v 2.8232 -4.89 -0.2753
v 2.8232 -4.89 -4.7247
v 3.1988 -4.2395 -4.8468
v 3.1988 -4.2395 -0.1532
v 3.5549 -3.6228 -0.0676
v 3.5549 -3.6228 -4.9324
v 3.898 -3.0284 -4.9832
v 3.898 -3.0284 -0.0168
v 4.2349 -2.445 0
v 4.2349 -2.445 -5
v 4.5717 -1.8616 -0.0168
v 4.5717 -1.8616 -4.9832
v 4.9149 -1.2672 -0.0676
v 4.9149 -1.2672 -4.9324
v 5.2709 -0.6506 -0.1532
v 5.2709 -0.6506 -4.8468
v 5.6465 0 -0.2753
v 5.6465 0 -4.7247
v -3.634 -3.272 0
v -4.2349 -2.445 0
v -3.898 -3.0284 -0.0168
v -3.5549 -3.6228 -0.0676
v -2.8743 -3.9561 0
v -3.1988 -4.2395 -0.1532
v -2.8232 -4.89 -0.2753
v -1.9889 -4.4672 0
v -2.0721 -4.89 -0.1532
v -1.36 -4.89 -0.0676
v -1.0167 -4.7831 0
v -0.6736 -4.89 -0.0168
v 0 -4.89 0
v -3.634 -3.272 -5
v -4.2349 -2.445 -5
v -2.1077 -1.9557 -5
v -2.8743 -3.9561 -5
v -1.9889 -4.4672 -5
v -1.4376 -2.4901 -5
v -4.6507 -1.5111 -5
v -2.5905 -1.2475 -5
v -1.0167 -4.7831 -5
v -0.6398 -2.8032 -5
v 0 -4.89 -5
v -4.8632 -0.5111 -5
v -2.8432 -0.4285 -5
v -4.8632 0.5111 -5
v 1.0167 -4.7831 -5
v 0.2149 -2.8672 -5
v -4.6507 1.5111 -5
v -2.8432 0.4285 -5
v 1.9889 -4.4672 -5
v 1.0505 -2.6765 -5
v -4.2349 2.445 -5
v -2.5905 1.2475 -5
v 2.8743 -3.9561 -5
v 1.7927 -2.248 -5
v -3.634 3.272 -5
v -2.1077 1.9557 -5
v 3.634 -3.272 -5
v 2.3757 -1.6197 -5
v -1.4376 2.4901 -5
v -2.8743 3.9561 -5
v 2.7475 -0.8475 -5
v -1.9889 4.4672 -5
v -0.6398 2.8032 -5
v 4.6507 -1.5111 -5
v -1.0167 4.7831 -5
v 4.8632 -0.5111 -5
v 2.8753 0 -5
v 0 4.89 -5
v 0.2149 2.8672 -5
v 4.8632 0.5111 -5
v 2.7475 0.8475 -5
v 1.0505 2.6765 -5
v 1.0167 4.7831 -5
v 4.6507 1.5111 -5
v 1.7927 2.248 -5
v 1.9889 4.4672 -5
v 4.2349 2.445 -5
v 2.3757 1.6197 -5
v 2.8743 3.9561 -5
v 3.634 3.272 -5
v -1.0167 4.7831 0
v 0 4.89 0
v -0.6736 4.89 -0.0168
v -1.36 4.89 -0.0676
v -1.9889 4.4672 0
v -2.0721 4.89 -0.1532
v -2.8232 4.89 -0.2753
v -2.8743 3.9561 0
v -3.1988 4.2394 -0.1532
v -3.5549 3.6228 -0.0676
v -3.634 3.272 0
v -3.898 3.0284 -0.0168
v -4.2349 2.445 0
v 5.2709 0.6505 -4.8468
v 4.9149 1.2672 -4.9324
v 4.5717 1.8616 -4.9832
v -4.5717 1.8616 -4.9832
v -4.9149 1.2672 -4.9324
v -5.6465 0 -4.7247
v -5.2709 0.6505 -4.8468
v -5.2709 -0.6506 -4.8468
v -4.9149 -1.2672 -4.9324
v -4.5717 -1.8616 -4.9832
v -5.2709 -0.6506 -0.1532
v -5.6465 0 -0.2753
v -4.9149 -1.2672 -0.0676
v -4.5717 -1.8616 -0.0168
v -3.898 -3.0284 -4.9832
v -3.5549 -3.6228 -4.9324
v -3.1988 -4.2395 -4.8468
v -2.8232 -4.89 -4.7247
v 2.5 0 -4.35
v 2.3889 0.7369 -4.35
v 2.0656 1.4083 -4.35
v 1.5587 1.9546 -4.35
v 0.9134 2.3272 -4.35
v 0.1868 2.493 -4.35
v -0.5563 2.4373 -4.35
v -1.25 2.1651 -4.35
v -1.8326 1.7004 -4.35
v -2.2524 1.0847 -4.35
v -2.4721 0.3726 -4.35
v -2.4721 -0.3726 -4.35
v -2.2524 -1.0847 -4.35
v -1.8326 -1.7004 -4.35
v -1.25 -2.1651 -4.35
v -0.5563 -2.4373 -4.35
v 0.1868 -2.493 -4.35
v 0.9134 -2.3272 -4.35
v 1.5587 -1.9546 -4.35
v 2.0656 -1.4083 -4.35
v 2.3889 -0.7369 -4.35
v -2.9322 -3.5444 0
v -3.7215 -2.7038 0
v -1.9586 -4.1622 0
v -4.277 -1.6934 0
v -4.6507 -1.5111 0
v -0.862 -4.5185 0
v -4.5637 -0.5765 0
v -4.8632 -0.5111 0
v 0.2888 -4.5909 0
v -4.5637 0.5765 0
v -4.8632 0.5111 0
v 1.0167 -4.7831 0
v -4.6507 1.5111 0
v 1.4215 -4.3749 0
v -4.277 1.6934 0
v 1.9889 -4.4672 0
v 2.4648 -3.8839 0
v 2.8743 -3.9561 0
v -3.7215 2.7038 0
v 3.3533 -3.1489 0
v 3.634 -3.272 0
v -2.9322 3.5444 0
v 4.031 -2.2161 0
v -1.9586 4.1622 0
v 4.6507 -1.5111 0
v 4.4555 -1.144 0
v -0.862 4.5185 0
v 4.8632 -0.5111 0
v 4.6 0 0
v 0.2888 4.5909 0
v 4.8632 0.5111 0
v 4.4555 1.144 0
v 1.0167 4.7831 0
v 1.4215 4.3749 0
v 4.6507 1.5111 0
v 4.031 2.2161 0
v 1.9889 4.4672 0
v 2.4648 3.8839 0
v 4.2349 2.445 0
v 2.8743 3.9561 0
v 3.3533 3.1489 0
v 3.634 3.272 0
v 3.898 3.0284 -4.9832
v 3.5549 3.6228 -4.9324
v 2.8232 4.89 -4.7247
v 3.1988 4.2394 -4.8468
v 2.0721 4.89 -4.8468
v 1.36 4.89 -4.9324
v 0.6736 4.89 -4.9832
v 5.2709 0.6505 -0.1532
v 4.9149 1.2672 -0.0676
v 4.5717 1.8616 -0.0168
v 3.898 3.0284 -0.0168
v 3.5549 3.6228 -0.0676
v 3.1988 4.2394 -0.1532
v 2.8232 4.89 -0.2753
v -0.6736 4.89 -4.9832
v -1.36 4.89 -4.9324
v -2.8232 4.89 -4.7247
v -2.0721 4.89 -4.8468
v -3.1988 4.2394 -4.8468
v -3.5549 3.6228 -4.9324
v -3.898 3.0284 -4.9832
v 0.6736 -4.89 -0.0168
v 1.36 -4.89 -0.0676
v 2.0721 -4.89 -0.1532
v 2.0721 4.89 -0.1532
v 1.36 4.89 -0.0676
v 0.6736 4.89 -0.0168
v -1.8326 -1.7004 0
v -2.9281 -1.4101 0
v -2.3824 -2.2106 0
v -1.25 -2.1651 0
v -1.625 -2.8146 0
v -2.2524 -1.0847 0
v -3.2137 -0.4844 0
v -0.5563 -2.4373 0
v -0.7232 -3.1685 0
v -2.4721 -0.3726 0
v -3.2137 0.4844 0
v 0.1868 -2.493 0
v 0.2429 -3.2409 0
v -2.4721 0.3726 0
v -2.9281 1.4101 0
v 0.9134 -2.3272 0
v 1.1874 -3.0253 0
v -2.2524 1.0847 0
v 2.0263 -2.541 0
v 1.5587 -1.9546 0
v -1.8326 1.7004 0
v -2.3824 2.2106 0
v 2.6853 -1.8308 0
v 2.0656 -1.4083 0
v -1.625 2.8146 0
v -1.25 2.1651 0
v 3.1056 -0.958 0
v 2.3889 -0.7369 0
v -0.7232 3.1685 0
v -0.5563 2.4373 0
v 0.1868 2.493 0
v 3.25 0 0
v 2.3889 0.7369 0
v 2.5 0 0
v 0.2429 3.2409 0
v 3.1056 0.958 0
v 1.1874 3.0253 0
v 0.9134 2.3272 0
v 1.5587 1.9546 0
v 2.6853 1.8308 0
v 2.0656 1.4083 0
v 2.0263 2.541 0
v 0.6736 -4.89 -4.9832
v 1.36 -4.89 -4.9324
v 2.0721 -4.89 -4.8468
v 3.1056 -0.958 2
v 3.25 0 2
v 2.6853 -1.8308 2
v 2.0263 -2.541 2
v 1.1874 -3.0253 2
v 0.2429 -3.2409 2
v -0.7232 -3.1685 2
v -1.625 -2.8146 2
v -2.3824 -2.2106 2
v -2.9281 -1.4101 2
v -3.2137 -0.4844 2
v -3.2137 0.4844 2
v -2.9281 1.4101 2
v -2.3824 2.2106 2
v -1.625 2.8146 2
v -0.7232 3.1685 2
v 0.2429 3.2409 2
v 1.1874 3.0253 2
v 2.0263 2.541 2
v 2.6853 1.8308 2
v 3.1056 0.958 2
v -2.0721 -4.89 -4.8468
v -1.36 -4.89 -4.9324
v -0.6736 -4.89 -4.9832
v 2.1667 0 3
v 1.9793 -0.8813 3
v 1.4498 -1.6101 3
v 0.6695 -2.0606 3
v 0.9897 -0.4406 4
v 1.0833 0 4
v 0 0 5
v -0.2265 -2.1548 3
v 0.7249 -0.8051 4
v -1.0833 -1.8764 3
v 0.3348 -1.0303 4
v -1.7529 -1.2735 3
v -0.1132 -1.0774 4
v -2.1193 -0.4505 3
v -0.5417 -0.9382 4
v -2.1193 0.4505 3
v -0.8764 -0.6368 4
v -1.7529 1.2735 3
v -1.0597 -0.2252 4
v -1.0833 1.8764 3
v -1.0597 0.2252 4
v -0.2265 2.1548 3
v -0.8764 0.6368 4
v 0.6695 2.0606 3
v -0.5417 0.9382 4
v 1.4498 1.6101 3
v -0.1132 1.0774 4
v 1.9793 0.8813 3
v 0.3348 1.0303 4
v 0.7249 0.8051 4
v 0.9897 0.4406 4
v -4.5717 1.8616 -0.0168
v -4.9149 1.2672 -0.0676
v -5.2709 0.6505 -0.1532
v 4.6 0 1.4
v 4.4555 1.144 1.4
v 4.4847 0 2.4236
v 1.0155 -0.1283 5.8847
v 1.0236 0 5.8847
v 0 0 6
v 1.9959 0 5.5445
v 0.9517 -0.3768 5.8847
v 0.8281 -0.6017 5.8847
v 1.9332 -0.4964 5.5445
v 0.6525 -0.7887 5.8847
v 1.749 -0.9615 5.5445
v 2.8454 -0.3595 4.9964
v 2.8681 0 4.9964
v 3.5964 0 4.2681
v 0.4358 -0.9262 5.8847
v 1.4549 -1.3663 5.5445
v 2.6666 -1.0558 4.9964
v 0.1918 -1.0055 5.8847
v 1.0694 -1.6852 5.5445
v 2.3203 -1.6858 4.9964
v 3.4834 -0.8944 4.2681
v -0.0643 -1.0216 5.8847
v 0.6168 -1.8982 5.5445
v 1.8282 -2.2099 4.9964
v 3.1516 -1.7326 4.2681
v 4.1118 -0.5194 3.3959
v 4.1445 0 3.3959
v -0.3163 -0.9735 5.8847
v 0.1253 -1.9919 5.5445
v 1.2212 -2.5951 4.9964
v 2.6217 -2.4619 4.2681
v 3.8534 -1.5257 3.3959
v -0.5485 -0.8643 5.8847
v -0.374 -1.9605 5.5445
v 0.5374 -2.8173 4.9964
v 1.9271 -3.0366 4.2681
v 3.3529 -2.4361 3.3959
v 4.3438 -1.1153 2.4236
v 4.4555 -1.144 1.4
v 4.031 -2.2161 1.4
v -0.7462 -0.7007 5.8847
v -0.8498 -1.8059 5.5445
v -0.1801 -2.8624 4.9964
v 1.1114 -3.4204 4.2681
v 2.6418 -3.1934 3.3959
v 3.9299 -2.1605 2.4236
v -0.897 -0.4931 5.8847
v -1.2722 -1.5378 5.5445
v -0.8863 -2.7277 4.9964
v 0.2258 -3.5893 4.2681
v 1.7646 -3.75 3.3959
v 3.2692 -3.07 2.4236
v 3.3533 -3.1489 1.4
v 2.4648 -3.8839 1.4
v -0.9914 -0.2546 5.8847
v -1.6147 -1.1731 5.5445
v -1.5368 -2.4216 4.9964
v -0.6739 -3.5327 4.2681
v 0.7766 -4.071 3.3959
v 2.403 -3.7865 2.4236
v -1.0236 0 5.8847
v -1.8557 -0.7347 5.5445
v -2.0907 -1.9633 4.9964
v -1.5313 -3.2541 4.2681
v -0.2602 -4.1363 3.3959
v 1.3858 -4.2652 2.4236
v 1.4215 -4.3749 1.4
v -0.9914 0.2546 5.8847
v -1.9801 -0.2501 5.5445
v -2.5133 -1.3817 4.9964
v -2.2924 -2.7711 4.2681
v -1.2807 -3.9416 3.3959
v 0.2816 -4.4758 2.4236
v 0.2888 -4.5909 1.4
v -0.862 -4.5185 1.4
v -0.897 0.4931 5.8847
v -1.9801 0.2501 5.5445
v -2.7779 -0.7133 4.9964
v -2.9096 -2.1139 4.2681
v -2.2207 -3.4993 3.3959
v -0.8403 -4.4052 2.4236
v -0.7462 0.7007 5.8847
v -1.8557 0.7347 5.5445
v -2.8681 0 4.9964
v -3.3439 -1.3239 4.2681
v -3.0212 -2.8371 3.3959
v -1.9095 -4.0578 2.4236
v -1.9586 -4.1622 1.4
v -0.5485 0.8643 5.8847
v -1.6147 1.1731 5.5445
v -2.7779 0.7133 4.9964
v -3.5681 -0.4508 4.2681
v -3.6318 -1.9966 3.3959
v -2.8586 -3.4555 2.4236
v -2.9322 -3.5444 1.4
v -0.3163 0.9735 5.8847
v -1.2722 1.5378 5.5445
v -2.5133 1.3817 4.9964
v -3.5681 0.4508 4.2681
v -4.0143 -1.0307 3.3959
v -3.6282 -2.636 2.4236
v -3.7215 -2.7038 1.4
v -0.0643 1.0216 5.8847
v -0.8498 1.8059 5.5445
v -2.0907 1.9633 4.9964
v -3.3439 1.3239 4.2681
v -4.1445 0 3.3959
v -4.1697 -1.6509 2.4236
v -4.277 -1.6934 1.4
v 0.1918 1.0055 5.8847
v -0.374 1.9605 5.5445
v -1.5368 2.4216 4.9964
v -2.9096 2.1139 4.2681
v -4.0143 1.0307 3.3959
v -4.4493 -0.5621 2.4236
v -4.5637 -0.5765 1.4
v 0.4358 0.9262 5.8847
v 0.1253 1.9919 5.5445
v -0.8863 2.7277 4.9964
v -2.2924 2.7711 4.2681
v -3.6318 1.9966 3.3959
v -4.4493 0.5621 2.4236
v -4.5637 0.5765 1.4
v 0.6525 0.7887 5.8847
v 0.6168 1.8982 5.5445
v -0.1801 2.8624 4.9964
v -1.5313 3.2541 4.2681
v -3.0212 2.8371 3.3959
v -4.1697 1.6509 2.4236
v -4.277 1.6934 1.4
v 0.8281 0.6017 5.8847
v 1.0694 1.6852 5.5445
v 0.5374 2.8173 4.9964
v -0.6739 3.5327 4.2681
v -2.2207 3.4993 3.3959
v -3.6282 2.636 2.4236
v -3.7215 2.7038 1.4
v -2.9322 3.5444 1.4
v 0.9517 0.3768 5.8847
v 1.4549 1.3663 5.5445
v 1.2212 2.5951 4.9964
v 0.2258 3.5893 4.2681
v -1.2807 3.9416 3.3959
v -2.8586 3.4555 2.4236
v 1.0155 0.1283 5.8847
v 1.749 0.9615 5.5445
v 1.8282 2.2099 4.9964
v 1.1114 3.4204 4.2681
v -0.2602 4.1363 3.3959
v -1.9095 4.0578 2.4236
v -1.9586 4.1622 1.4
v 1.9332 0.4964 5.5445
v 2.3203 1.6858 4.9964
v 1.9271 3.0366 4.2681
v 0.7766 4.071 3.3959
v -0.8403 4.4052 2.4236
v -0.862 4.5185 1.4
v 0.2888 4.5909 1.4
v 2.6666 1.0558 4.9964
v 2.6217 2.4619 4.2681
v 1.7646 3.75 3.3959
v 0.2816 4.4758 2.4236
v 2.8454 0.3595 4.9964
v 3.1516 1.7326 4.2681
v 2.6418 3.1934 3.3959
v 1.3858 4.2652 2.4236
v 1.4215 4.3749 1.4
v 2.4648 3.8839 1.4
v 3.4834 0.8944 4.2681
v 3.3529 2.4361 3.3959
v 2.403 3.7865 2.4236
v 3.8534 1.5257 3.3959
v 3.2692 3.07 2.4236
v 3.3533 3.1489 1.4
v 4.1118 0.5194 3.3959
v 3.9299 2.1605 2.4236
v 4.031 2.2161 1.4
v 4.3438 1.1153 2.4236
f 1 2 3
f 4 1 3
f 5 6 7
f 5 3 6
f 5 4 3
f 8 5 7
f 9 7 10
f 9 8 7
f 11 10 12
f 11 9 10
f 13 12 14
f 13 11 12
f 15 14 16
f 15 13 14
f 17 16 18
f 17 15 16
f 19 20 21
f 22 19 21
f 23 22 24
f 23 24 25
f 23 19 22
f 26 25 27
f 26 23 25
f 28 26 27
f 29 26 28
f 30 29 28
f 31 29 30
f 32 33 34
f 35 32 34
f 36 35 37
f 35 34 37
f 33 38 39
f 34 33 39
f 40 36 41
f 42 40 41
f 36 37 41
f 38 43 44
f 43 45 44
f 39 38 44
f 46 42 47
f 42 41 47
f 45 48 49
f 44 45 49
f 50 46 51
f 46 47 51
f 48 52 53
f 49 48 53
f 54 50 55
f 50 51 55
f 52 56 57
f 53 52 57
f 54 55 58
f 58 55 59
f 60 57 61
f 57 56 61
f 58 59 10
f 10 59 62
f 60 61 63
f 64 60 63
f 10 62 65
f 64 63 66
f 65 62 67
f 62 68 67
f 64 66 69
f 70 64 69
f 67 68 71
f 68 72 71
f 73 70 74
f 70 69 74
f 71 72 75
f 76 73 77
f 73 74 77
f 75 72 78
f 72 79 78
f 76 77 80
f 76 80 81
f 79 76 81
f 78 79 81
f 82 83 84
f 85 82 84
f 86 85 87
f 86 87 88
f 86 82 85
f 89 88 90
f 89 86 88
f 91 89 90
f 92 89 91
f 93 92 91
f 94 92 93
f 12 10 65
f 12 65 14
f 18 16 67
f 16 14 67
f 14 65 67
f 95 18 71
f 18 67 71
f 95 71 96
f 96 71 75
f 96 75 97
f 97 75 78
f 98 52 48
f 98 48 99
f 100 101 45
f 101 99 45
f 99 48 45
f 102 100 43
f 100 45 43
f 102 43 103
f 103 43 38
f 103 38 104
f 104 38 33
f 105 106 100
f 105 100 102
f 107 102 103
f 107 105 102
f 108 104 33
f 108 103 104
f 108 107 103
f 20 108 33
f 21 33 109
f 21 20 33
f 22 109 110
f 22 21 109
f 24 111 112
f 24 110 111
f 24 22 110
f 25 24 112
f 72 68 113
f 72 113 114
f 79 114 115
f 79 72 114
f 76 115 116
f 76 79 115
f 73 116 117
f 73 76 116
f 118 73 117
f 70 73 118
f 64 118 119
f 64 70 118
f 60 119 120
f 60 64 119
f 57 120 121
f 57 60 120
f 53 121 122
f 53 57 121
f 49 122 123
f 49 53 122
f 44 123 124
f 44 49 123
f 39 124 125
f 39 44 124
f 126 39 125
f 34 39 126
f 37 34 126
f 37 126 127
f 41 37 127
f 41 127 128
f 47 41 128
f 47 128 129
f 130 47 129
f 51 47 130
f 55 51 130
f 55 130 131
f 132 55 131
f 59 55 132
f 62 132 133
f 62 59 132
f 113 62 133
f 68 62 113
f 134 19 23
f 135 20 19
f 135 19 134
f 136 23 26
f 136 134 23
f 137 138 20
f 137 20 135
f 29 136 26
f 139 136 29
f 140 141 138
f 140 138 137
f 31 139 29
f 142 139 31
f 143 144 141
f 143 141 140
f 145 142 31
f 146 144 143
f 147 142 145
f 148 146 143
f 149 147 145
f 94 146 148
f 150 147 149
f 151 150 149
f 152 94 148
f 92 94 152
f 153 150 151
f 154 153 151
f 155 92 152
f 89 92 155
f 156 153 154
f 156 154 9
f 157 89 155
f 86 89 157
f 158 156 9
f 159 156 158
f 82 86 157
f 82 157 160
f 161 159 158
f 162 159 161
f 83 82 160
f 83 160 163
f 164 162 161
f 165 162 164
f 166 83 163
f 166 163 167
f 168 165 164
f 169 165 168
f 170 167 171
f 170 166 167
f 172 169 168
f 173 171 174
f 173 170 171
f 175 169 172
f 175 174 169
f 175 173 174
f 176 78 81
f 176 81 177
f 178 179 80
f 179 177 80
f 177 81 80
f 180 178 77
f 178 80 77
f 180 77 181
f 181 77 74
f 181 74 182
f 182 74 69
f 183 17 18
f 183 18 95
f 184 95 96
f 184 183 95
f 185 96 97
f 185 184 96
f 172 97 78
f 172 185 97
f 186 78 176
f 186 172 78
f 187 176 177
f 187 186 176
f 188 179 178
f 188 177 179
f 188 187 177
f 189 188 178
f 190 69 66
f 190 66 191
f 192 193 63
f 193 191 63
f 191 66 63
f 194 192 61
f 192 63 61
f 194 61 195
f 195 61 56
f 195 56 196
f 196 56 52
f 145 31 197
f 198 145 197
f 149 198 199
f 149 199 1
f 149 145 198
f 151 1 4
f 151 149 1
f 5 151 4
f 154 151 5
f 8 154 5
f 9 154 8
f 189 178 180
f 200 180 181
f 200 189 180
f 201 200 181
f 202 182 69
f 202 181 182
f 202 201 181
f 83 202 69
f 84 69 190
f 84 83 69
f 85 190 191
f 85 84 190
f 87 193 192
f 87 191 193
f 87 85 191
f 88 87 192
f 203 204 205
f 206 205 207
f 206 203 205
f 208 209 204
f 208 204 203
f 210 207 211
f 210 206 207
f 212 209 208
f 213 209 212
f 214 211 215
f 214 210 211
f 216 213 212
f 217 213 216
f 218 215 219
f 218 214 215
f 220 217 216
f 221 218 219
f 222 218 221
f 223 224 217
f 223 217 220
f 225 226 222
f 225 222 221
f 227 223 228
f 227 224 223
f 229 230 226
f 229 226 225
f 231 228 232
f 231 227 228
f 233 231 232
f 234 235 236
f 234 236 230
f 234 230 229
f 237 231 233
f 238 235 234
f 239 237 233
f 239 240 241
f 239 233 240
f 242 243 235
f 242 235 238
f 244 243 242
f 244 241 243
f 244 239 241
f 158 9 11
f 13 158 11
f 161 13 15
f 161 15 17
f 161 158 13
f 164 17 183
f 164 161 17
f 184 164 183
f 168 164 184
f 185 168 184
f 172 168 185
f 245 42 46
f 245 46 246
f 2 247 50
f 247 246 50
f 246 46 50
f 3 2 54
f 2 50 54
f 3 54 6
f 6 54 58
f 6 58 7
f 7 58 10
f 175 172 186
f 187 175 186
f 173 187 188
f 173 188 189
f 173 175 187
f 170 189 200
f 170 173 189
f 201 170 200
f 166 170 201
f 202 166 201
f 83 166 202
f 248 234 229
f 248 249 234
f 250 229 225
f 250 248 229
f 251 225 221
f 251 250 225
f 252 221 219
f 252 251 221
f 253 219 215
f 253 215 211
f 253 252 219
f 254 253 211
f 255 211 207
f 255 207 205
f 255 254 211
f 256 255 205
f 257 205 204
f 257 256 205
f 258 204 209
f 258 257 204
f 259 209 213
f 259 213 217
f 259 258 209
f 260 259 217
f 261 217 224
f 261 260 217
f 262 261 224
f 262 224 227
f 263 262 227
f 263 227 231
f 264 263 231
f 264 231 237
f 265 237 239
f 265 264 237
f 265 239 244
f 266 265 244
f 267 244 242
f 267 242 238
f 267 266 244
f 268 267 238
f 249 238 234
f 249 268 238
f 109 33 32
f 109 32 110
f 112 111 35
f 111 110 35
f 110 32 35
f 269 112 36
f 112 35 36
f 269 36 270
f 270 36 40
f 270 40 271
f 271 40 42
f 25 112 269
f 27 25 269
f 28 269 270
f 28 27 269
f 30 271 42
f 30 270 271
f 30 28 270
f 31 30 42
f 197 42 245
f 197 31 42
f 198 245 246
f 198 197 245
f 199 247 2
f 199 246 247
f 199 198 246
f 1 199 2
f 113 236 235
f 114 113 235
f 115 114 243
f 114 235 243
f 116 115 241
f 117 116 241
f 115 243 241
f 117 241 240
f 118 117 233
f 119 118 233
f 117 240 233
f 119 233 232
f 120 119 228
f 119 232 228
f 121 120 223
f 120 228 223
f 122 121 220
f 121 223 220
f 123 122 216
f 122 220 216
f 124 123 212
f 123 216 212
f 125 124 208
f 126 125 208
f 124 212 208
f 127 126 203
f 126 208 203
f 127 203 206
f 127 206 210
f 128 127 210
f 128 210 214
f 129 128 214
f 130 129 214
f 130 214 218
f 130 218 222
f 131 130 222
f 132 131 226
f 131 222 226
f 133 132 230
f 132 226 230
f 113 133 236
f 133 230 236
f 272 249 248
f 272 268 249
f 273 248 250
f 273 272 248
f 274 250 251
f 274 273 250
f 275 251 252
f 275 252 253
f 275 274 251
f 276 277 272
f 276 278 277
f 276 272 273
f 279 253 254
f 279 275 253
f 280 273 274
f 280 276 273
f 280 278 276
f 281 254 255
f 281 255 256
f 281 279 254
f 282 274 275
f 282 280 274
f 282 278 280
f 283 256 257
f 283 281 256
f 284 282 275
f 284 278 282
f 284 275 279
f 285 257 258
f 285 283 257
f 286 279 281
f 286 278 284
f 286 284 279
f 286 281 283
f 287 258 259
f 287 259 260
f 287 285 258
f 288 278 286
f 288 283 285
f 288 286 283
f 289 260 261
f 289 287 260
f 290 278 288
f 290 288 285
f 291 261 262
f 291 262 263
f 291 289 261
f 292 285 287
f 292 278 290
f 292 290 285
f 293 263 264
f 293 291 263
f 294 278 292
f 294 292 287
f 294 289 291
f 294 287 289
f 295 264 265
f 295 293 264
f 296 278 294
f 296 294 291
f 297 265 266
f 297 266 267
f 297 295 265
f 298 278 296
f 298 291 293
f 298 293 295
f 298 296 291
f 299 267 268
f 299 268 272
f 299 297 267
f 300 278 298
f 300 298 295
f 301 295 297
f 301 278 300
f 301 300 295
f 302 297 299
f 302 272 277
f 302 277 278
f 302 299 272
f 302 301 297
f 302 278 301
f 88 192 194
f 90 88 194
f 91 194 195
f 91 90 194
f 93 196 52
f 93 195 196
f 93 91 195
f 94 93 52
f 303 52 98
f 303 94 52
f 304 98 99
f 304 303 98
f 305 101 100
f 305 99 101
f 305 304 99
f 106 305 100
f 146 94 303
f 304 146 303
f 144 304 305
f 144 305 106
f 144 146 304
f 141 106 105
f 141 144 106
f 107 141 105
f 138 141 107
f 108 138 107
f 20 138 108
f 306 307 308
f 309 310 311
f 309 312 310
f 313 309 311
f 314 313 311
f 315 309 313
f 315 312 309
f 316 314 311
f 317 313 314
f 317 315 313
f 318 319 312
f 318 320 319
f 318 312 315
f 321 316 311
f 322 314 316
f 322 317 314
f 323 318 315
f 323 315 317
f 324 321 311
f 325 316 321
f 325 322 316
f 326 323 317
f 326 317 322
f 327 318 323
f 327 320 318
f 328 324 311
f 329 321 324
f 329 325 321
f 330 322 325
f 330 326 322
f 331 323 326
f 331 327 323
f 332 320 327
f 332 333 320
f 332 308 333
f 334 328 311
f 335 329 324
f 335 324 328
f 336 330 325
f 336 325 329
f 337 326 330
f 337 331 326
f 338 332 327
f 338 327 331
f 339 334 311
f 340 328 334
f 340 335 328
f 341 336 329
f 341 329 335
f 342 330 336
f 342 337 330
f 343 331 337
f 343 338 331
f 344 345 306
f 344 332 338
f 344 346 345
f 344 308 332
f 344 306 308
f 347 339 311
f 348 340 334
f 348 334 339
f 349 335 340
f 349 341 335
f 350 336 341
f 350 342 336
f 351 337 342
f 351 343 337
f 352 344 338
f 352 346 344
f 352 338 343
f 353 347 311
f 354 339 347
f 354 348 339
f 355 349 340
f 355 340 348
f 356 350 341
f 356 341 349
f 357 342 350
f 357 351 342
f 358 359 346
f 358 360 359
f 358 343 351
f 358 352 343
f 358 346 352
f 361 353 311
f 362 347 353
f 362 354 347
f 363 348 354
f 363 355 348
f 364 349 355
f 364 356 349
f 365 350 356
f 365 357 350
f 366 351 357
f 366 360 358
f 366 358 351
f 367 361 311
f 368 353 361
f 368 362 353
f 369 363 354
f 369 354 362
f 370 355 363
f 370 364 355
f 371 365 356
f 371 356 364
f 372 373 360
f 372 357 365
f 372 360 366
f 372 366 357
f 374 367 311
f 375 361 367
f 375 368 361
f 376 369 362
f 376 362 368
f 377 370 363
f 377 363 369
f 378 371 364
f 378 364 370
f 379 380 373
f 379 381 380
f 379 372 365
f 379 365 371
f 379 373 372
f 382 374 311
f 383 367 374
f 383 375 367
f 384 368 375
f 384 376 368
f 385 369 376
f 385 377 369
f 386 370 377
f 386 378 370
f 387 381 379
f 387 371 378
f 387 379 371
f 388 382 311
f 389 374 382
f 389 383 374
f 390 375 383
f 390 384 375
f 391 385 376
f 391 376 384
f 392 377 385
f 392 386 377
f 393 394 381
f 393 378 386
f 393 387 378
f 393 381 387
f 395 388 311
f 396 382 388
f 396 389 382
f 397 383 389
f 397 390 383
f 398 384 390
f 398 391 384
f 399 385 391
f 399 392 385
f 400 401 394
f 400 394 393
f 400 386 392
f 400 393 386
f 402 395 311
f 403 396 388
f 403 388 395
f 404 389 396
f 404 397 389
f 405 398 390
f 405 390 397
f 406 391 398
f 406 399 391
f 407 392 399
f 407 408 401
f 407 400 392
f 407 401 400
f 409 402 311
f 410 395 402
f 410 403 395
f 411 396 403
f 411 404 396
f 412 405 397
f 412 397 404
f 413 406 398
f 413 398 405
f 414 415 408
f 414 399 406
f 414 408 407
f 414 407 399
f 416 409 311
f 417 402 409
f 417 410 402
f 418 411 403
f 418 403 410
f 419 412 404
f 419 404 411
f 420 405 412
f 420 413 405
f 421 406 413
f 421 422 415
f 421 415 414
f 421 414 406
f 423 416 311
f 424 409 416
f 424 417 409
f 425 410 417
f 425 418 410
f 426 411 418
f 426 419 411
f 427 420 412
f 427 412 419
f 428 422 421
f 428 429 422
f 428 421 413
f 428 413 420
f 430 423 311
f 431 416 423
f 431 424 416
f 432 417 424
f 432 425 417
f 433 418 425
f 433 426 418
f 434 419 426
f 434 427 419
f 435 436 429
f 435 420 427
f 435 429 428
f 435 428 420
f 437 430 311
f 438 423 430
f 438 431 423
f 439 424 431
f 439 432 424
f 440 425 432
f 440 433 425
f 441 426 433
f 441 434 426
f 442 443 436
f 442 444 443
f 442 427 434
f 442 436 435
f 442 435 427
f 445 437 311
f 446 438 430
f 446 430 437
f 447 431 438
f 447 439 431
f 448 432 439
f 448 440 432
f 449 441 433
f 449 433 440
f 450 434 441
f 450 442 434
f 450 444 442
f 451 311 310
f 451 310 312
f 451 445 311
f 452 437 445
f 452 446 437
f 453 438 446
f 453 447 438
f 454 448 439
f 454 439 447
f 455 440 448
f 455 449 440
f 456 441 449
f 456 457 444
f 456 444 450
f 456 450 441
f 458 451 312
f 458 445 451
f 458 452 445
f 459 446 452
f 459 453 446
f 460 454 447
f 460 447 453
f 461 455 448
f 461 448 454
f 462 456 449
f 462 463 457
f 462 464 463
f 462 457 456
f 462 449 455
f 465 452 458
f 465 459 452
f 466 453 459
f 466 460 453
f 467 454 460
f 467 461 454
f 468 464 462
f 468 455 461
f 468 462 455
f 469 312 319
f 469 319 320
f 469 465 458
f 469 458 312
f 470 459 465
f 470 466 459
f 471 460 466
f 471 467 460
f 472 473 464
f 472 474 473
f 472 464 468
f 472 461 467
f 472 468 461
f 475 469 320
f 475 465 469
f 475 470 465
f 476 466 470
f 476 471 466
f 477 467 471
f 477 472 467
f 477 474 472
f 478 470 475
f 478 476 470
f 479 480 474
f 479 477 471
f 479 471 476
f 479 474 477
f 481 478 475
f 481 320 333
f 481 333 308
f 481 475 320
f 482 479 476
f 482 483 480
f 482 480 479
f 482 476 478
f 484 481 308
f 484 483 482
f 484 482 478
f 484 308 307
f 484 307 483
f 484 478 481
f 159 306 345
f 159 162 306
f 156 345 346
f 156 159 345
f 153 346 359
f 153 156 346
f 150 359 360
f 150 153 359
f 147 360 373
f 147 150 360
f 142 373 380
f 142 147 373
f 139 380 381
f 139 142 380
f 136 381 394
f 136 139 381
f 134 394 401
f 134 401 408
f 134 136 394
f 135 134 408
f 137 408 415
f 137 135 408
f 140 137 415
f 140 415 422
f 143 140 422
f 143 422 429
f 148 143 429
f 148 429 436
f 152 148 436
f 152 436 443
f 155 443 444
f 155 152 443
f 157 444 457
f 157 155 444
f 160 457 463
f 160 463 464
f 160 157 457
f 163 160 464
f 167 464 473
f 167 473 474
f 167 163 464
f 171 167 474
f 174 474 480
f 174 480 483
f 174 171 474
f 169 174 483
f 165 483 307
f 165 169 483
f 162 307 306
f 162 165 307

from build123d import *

# Parameters (mm, degrees)
SKETCH1_R        = 2.5
BASENUT_DEPTH    = 5
ENDCHAMFER_SIZE  = 0.65
ENDCHAMFER_SIZE2 = 0.375277675


with BuildPart() as part:
    # Sketch1 → BaseNut (new body)
    with BuildSketch(Plane.XY):
        Polygon((5.646485633, 0), (2.823242816, 4.89), (-2.823242816, 4.89), (-5.646485633, 0), (-2.823242816, -4.89), (2.823242816, -4.89), align=None)
        Circle(SKETCH1_R, mode=Mode.SUBTRACT)
    extrude(amount=-BASENUT_DEPTH)

    # Sketch2 → DoubleChamfer (revolve, cut)
    with BuildSketch(Plane(origin=(0, 0, 0), x_dir=(1, 0, 0), z_dir=(0, 1, 0))):
        Polygon((-4.89, 5), (-5.646485633, 5), (-5.646485633, 4.724661747), align=None)
        Polygon((-5.646485633, 0.275338253), (-4.89, 0), (-5.646485633, 0), align=None)
    revolve(axis=Axis((0, 0, -3.377940403), (0, 0, 1)), mode=Mode.SUBTRACT)

    # Sketch3 → Crown (revolve)
    with BuildSketch(Plane(origin=(-4.6, 0, -6), x_dir=(-1, 0, 0), z_dir=(0, 1, 0))):
        with BuildLine():
            Line((-9.2, 7.4), (-9.2, 6))
            Line((-9.2, 6), (-7.85, 6))
            Line((-7.85, 6), (-7.85, 8))
            Line((-7.85, 8), (-4.6, 11))
            Line((-4.6, 11), (-4.6, 12))
            ThreePointArc((-4.6, 12), (-7.852691193, 10.652691193), (-9.2, 7.4))
        make_face()
    revolve(axis=Axis((0, 0, 6), (0, 0, -1)))

    # EndChamfer
    endchamfer_edges = [part.edges().sort_by_distance(p)[0] for p in [
        (-2.5, 0, -5),
    ]]
    endchamfer_side = [part.faces().sort_by_distance(p)[0] for p in [
        (-2.5, 0, -2.5),
    ]]
    chamfer(endchamfer_edges, length=ENDCHAMFER_SIZE, length2=ENDCHAMFER_SIZE2, reference=endchamfer_side[0])


solid = part.part
